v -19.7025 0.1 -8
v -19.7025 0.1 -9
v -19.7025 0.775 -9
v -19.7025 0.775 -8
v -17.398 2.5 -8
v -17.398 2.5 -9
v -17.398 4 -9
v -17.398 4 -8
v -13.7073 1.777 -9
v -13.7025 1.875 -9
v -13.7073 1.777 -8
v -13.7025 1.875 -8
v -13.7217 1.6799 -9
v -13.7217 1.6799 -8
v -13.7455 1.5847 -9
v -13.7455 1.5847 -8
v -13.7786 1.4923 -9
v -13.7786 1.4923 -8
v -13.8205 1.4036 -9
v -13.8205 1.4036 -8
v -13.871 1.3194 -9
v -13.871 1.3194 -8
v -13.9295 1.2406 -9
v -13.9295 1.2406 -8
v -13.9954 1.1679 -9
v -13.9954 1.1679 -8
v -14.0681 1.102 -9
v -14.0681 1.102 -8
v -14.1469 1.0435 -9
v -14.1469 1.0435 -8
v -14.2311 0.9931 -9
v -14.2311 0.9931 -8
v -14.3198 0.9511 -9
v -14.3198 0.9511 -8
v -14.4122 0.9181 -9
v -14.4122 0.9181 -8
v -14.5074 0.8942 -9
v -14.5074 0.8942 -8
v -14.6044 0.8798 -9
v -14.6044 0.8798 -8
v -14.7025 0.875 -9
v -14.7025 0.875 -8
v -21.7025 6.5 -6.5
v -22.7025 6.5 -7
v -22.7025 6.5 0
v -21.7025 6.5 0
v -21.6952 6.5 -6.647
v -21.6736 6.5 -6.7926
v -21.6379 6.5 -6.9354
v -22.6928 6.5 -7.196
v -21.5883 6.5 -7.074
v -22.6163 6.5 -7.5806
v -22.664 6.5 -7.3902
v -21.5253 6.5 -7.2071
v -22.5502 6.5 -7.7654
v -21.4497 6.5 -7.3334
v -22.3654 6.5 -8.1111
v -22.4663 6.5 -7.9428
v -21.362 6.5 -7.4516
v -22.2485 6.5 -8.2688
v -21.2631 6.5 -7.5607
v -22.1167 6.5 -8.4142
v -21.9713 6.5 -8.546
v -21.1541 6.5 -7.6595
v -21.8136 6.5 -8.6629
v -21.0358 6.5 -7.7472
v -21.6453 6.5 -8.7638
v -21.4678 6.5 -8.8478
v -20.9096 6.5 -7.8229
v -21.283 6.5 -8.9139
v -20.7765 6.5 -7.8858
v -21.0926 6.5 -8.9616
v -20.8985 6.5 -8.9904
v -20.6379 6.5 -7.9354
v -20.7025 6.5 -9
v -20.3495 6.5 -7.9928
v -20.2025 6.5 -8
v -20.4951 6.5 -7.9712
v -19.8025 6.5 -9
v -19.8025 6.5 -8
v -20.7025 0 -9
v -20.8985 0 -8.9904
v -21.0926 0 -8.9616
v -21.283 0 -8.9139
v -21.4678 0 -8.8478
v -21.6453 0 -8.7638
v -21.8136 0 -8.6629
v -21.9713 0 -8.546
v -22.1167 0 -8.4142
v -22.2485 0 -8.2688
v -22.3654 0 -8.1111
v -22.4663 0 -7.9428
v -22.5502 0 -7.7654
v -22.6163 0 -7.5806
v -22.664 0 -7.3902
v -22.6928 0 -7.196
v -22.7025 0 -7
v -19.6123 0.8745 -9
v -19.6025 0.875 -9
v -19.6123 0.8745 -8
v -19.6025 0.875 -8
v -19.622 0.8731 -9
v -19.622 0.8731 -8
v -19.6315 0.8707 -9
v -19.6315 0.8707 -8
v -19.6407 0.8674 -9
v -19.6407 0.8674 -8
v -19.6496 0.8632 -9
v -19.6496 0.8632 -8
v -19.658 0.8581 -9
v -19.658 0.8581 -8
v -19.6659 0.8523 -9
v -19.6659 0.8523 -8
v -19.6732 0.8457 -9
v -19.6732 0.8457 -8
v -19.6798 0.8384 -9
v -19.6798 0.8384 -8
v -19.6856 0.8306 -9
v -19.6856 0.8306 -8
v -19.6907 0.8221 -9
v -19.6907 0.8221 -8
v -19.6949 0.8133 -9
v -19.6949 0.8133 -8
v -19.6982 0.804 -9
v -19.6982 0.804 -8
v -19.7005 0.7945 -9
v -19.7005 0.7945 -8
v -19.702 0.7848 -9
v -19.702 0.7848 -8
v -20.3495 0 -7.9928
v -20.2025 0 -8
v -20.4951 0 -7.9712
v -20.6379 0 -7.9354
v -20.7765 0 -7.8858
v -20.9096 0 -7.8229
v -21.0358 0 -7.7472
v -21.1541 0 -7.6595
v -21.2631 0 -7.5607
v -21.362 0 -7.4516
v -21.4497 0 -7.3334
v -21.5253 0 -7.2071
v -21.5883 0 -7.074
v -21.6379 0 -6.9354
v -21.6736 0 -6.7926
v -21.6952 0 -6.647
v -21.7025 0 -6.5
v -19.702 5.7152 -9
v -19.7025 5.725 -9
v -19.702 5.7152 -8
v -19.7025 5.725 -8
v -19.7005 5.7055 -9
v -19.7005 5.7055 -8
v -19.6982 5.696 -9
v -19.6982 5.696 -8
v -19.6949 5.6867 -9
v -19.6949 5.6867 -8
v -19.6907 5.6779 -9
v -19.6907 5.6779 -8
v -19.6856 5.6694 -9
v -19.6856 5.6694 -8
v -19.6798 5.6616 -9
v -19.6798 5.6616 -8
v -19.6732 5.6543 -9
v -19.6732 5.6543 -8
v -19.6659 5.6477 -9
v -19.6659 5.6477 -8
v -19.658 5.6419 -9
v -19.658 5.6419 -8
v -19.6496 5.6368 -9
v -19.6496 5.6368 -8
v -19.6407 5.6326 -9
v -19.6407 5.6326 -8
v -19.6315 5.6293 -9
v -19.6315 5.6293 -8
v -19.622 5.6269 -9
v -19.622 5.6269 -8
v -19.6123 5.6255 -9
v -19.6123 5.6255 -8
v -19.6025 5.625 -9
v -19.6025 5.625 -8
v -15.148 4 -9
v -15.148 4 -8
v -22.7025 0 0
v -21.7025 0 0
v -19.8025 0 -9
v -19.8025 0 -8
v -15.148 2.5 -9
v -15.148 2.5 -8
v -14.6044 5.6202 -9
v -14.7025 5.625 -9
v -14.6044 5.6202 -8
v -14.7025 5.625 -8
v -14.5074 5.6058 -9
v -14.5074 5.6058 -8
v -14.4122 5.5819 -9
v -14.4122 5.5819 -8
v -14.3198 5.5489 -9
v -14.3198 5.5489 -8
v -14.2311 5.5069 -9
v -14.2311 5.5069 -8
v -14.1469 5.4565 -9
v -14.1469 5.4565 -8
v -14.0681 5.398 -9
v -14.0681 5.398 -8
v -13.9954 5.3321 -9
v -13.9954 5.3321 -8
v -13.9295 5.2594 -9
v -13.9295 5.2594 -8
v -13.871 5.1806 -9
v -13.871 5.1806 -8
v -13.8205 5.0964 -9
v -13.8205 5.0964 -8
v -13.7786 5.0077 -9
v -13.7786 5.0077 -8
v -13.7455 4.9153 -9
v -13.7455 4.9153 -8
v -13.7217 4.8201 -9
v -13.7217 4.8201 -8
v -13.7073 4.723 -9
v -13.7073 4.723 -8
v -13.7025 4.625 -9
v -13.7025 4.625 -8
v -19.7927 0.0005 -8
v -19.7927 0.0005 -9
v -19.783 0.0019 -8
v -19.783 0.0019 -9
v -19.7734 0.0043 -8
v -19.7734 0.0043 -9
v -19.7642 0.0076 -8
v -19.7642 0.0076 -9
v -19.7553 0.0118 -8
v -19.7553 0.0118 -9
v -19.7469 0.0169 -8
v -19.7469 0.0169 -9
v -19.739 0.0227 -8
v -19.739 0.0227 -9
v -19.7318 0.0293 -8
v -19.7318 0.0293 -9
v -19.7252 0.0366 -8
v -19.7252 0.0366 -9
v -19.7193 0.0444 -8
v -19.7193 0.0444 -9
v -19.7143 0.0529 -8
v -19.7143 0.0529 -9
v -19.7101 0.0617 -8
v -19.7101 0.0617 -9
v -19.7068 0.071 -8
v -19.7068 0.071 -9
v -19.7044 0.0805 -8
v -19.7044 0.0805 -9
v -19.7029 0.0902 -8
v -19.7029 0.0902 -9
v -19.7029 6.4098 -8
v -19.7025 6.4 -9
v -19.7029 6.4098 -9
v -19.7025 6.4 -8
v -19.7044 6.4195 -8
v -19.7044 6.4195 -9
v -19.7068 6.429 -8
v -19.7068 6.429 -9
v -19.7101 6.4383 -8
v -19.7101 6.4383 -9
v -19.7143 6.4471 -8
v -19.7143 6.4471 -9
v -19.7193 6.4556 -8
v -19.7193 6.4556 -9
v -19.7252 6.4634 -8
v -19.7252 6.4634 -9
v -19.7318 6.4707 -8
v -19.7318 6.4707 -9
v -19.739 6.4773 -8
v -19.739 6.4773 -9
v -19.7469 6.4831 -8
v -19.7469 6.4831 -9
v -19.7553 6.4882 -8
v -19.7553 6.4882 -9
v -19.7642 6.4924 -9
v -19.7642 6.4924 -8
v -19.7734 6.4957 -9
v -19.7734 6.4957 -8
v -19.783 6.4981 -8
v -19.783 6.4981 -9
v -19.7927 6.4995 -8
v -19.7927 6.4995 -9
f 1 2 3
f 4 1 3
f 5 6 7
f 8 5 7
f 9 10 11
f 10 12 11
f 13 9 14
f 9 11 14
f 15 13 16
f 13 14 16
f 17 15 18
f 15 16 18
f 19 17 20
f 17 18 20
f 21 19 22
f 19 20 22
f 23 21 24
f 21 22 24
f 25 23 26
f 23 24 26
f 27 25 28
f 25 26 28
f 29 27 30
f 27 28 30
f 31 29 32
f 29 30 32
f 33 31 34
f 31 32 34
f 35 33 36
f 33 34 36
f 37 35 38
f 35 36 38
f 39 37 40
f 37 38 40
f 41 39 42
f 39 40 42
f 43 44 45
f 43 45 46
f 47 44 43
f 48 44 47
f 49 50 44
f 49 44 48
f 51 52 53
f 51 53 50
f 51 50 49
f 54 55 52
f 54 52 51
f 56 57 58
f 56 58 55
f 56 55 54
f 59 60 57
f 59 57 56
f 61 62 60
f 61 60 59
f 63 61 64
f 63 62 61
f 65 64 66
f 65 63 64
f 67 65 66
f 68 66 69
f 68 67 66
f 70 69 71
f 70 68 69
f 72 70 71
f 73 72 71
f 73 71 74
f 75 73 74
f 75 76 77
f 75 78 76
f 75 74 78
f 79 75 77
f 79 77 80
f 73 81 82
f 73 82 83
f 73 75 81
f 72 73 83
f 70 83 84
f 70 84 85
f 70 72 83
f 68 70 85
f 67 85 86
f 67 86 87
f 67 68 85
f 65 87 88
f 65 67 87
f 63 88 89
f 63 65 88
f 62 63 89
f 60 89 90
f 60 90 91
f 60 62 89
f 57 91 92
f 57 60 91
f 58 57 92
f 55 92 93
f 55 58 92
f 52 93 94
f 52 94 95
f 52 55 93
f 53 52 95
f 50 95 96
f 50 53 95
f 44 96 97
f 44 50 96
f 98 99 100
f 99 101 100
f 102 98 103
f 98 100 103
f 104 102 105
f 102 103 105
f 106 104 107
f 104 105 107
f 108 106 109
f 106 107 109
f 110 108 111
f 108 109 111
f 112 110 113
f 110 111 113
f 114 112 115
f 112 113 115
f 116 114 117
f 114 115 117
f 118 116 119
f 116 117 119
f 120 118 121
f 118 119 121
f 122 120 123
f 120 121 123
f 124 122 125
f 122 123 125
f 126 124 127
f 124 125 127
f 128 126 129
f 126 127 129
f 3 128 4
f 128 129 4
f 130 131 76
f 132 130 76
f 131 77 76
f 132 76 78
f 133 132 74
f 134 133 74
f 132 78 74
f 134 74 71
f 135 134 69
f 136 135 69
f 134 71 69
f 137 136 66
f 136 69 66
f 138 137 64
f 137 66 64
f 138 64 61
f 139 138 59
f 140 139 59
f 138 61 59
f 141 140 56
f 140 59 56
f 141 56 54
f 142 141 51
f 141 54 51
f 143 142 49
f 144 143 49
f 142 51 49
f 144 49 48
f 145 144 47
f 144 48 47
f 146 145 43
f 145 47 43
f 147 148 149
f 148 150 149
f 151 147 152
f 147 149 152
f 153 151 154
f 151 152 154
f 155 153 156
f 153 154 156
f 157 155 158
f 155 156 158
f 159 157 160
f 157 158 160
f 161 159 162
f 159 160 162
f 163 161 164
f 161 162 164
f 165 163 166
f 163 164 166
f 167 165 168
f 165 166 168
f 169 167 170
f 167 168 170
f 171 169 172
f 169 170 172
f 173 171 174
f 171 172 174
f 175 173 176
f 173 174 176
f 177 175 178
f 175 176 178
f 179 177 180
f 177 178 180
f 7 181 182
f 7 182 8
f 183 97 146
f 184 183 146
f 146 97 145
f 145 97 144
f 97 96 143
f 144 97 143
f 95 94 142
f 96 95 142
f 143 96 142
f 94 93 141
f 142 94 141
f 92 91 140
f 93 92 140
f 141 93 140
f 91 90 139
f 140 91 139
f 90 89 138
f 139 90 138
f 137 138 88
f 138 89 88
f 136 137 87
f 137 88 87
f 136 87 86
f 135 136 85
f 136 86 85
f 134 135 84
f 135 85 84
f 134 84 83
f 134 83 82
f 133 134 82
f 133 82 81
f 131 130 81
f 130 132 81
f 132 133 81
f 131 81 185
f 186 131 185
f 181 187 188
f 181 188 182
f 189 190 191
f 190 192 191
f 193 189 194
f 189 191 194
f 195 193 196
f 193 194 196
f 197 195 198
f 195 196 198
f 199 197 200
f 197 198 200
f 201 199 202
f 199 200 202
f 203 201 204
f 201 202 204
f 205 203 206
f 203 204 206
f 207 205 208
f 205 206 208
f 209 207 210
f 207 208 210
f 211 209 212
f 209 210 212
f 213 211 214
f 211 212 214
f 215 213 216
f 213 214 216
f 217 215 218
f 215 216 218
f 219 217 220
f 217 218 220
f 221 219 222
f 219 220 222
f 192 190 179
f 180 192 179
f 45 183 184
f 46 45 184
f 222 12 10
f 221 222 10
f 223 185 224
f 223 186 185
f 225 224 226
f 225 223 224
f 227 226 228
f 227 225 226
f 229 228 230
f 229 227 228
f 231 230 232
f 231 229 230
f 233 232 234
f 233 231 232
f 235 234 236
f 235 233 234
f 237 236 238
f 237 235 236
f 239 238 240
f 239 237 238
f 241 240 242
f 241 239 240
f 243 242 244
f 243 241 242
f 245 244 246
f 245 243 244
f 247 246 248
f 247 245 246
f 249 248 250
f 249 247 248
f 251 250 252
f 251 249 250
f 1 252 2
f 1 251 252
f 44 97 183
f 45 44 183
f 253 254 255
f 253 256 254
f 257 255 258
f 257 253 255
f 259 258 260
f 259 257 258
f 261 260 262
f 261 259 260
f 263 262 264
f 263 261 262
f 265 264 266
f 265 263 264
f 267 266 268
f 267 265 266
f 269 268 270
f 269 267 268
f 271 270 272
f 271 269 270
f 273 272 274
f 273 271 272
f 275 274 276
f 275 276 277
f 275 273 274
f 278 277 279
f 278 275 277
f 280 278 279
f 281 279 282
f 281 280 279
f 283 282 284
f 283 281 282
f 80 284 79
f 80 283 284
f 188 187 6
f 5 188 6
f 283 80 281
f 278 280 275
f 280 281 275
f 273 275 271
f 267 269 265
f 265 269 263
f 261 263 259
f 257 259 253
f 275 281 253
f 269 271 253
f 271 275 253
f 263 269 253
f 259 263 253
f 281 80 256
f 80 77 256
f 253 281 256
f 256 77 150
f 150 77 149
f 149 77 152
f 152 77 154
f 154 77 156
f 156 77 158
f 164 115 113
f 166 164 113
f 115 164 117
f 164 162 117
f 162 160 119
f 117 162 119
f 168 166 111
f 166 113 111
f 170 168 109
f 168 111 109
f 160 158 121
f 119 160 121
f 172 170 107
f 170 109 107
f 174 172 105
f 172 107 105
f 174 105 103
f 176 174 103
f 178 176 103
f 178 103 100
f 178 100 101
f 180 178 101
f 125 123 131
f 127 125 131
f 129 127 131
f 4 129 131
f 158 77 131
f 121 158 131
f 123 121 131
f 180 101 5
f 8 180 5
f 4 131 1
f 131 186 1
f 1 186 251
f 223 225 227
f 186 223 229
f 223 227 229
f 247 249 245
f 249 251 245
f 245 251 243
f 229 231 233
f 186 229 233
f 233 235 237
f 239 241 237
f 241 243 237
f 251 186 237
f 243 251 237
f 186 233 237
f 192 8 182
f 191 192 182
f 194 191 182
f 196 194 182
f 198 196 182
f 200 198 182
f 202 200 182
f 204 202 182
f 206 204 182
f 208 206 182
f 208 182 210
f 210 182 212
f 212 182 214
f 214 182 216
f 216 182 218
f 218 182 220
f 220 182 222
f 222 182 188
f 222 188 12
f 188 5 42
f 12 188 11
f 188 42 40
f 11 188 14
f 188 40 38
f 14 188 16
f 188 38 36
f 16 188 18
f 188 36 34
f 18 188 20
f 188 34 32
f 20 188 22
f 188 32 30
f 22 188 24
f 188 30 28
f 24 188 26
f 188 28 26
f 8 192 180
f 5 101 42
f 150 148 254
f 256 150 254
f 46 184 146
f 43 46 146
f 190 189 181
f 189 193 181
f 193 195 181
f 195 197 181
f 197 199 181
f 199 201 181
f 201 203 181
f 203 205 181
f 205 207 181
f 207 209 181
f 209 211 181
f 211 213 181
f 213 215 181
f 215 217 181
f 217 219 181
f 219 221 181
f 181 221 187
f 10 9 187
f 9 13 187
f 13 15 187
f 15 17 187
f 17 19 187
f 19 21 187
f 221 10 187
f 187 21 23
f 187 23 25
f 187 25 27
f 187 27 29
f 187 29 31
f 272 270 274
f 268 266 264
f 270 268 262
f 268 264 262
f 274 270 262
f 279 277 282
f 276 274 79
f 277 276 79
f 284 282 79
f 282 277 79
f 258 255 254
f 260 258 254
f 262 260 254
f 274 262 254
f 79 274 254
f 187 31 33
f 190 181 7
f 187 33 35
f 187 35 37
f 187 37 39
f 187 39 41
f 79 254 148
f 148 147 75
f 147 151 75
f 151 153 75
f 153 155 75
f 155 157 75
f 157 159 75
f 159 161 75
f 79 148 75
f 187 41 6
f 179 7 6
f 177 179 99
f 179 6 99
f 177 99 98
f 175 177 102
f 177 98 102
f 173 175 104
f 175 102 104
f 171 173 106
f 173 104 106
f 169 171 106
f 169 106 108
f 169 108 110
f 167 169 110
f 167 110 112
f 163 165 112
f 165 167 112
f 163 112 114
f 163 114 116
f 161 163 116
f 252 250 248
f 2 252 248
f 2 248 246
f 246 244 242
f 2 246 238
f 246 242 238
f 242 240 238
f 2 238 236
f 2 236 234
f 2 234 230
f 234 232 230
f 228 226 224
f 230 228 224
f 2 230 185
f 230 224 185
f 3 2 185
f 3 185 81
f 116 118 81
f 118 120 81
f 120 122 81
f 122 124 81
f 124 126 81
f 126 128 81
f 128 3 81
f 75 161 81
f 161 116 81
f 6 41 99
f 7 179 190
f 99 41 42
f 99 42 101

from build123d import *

# Parameters (mm, degrees)
EXTRUDE_1_DEPTH     = 6.5
FILLET_1_R          = 2
FILLET_2_R          = 1.5
SKETCH_2_W          = 6
SKETCH_2_H          = 0.875
CUT_EXTRUDE_1_DEPTH = 10
FILLET_4_R          = 1
FILLET_5_R          = 0.1
FILLET_6_R          = 0.1
SKETCH_3_W          = 2.25
SKETCH_3_H          = 1.5
CUT_EXTRUDE_2_DEPTH = 10


with BuildPart() as part:
    # Эскиз1 → Бобышка-Вытянуть1 (new body)
    with BuildSketch(Plane(origin=(0, 0, 0), x_dir=(1, 0, 0), z_dir=(0, 1, 0))):
        Polygon((-22.702464419, 0), (-21.702464419, 0), (-21.702464419, 8), (-13.702464419, 8), (-13.702464419, 9), (-22.702464419, 9), align=None)
    extrude(amount=EXTRUDE_1_DEPTH)

    # Скругление1
    fillet_1_edges = [part.edges().sort_by_distance(p)[0] for p in [
        (-22.702464419, 3.25, -9),
    ]]
    fillet(fillet_1_edges, radius=FILLET_1_R)

    # Скругление2
    fillet_2_edges = [part.edges().sort_by_distance(p)[0] for p in [
        (-21.702464419, 3.25, -8),
    ]]
    fillet(fillet_2_edges, radius=FILLET_2_R)

    # Эскиз2 → Вырез-Вытянуть1 (cut, through all)
    with BuildSketch(Plane(origin=(0, 0, -9), x_dir=(-1, 0, 0), z_dir=(0, 0, -1))):
        with Locations((16.702464419, 0.4375)):
            Rectangle(SKETCH_2_W, SKETCH_2_H)
        with Locations((16.702464419, 6.0625)):
            Rectangle(SKETCH_2_W, SKETCH_2_H)
    extrude(amount=-CUT_EXTRUDE_1_DEPTH, mode=Mode.SUBTRACT)

    # Скругление4
    fillet_4_edges = [part.edges().sort_by_distance(p)[0] for p in [
        (-13.702464419, 0.875, -8.5),
        (-13.702464419, 5.625, -8.5),
    ]]
    fillet(fillet_4_edges, radius=FILLET_4_R)

    # Скругление5
    fillet_5_edges = [part.edges().sort_by_distance(p)[0] for p in [
        (-19.702464419, 0, -8.5),
        (-19.702464419, 6.5, -8.5),
    ]]
    fillet(fillet_5_edges, radius=FILLET_5_R)

    # Скругление6
    fillet_6_edges = [part.edges().sort_by_distance(p)[0] for p in [
        (-19.702464419, 0.875, -8.5),
        (-19.702464419, 5.625, -8.5),
    ]]
    fillet(fillet_6_edges, radius=FILLET_6_R)

    # Эскиз3 → Вырез-Вытянуть2 (cut, through all)
    with BuildSketch(Plane(origin=(0, 0, -9), x_dir=(-1, 0, 0), z_dir=(0, 0, -1))):
        with Locations((16.273003047, 3.25)):
            Rectangle(SKETCH_3_W, SKETCH_3_H)
    extrude(amount=-CUT_EXTRUDE_2_DEPTH, mode=Mode.SUBTRACT)


solid = part.part
